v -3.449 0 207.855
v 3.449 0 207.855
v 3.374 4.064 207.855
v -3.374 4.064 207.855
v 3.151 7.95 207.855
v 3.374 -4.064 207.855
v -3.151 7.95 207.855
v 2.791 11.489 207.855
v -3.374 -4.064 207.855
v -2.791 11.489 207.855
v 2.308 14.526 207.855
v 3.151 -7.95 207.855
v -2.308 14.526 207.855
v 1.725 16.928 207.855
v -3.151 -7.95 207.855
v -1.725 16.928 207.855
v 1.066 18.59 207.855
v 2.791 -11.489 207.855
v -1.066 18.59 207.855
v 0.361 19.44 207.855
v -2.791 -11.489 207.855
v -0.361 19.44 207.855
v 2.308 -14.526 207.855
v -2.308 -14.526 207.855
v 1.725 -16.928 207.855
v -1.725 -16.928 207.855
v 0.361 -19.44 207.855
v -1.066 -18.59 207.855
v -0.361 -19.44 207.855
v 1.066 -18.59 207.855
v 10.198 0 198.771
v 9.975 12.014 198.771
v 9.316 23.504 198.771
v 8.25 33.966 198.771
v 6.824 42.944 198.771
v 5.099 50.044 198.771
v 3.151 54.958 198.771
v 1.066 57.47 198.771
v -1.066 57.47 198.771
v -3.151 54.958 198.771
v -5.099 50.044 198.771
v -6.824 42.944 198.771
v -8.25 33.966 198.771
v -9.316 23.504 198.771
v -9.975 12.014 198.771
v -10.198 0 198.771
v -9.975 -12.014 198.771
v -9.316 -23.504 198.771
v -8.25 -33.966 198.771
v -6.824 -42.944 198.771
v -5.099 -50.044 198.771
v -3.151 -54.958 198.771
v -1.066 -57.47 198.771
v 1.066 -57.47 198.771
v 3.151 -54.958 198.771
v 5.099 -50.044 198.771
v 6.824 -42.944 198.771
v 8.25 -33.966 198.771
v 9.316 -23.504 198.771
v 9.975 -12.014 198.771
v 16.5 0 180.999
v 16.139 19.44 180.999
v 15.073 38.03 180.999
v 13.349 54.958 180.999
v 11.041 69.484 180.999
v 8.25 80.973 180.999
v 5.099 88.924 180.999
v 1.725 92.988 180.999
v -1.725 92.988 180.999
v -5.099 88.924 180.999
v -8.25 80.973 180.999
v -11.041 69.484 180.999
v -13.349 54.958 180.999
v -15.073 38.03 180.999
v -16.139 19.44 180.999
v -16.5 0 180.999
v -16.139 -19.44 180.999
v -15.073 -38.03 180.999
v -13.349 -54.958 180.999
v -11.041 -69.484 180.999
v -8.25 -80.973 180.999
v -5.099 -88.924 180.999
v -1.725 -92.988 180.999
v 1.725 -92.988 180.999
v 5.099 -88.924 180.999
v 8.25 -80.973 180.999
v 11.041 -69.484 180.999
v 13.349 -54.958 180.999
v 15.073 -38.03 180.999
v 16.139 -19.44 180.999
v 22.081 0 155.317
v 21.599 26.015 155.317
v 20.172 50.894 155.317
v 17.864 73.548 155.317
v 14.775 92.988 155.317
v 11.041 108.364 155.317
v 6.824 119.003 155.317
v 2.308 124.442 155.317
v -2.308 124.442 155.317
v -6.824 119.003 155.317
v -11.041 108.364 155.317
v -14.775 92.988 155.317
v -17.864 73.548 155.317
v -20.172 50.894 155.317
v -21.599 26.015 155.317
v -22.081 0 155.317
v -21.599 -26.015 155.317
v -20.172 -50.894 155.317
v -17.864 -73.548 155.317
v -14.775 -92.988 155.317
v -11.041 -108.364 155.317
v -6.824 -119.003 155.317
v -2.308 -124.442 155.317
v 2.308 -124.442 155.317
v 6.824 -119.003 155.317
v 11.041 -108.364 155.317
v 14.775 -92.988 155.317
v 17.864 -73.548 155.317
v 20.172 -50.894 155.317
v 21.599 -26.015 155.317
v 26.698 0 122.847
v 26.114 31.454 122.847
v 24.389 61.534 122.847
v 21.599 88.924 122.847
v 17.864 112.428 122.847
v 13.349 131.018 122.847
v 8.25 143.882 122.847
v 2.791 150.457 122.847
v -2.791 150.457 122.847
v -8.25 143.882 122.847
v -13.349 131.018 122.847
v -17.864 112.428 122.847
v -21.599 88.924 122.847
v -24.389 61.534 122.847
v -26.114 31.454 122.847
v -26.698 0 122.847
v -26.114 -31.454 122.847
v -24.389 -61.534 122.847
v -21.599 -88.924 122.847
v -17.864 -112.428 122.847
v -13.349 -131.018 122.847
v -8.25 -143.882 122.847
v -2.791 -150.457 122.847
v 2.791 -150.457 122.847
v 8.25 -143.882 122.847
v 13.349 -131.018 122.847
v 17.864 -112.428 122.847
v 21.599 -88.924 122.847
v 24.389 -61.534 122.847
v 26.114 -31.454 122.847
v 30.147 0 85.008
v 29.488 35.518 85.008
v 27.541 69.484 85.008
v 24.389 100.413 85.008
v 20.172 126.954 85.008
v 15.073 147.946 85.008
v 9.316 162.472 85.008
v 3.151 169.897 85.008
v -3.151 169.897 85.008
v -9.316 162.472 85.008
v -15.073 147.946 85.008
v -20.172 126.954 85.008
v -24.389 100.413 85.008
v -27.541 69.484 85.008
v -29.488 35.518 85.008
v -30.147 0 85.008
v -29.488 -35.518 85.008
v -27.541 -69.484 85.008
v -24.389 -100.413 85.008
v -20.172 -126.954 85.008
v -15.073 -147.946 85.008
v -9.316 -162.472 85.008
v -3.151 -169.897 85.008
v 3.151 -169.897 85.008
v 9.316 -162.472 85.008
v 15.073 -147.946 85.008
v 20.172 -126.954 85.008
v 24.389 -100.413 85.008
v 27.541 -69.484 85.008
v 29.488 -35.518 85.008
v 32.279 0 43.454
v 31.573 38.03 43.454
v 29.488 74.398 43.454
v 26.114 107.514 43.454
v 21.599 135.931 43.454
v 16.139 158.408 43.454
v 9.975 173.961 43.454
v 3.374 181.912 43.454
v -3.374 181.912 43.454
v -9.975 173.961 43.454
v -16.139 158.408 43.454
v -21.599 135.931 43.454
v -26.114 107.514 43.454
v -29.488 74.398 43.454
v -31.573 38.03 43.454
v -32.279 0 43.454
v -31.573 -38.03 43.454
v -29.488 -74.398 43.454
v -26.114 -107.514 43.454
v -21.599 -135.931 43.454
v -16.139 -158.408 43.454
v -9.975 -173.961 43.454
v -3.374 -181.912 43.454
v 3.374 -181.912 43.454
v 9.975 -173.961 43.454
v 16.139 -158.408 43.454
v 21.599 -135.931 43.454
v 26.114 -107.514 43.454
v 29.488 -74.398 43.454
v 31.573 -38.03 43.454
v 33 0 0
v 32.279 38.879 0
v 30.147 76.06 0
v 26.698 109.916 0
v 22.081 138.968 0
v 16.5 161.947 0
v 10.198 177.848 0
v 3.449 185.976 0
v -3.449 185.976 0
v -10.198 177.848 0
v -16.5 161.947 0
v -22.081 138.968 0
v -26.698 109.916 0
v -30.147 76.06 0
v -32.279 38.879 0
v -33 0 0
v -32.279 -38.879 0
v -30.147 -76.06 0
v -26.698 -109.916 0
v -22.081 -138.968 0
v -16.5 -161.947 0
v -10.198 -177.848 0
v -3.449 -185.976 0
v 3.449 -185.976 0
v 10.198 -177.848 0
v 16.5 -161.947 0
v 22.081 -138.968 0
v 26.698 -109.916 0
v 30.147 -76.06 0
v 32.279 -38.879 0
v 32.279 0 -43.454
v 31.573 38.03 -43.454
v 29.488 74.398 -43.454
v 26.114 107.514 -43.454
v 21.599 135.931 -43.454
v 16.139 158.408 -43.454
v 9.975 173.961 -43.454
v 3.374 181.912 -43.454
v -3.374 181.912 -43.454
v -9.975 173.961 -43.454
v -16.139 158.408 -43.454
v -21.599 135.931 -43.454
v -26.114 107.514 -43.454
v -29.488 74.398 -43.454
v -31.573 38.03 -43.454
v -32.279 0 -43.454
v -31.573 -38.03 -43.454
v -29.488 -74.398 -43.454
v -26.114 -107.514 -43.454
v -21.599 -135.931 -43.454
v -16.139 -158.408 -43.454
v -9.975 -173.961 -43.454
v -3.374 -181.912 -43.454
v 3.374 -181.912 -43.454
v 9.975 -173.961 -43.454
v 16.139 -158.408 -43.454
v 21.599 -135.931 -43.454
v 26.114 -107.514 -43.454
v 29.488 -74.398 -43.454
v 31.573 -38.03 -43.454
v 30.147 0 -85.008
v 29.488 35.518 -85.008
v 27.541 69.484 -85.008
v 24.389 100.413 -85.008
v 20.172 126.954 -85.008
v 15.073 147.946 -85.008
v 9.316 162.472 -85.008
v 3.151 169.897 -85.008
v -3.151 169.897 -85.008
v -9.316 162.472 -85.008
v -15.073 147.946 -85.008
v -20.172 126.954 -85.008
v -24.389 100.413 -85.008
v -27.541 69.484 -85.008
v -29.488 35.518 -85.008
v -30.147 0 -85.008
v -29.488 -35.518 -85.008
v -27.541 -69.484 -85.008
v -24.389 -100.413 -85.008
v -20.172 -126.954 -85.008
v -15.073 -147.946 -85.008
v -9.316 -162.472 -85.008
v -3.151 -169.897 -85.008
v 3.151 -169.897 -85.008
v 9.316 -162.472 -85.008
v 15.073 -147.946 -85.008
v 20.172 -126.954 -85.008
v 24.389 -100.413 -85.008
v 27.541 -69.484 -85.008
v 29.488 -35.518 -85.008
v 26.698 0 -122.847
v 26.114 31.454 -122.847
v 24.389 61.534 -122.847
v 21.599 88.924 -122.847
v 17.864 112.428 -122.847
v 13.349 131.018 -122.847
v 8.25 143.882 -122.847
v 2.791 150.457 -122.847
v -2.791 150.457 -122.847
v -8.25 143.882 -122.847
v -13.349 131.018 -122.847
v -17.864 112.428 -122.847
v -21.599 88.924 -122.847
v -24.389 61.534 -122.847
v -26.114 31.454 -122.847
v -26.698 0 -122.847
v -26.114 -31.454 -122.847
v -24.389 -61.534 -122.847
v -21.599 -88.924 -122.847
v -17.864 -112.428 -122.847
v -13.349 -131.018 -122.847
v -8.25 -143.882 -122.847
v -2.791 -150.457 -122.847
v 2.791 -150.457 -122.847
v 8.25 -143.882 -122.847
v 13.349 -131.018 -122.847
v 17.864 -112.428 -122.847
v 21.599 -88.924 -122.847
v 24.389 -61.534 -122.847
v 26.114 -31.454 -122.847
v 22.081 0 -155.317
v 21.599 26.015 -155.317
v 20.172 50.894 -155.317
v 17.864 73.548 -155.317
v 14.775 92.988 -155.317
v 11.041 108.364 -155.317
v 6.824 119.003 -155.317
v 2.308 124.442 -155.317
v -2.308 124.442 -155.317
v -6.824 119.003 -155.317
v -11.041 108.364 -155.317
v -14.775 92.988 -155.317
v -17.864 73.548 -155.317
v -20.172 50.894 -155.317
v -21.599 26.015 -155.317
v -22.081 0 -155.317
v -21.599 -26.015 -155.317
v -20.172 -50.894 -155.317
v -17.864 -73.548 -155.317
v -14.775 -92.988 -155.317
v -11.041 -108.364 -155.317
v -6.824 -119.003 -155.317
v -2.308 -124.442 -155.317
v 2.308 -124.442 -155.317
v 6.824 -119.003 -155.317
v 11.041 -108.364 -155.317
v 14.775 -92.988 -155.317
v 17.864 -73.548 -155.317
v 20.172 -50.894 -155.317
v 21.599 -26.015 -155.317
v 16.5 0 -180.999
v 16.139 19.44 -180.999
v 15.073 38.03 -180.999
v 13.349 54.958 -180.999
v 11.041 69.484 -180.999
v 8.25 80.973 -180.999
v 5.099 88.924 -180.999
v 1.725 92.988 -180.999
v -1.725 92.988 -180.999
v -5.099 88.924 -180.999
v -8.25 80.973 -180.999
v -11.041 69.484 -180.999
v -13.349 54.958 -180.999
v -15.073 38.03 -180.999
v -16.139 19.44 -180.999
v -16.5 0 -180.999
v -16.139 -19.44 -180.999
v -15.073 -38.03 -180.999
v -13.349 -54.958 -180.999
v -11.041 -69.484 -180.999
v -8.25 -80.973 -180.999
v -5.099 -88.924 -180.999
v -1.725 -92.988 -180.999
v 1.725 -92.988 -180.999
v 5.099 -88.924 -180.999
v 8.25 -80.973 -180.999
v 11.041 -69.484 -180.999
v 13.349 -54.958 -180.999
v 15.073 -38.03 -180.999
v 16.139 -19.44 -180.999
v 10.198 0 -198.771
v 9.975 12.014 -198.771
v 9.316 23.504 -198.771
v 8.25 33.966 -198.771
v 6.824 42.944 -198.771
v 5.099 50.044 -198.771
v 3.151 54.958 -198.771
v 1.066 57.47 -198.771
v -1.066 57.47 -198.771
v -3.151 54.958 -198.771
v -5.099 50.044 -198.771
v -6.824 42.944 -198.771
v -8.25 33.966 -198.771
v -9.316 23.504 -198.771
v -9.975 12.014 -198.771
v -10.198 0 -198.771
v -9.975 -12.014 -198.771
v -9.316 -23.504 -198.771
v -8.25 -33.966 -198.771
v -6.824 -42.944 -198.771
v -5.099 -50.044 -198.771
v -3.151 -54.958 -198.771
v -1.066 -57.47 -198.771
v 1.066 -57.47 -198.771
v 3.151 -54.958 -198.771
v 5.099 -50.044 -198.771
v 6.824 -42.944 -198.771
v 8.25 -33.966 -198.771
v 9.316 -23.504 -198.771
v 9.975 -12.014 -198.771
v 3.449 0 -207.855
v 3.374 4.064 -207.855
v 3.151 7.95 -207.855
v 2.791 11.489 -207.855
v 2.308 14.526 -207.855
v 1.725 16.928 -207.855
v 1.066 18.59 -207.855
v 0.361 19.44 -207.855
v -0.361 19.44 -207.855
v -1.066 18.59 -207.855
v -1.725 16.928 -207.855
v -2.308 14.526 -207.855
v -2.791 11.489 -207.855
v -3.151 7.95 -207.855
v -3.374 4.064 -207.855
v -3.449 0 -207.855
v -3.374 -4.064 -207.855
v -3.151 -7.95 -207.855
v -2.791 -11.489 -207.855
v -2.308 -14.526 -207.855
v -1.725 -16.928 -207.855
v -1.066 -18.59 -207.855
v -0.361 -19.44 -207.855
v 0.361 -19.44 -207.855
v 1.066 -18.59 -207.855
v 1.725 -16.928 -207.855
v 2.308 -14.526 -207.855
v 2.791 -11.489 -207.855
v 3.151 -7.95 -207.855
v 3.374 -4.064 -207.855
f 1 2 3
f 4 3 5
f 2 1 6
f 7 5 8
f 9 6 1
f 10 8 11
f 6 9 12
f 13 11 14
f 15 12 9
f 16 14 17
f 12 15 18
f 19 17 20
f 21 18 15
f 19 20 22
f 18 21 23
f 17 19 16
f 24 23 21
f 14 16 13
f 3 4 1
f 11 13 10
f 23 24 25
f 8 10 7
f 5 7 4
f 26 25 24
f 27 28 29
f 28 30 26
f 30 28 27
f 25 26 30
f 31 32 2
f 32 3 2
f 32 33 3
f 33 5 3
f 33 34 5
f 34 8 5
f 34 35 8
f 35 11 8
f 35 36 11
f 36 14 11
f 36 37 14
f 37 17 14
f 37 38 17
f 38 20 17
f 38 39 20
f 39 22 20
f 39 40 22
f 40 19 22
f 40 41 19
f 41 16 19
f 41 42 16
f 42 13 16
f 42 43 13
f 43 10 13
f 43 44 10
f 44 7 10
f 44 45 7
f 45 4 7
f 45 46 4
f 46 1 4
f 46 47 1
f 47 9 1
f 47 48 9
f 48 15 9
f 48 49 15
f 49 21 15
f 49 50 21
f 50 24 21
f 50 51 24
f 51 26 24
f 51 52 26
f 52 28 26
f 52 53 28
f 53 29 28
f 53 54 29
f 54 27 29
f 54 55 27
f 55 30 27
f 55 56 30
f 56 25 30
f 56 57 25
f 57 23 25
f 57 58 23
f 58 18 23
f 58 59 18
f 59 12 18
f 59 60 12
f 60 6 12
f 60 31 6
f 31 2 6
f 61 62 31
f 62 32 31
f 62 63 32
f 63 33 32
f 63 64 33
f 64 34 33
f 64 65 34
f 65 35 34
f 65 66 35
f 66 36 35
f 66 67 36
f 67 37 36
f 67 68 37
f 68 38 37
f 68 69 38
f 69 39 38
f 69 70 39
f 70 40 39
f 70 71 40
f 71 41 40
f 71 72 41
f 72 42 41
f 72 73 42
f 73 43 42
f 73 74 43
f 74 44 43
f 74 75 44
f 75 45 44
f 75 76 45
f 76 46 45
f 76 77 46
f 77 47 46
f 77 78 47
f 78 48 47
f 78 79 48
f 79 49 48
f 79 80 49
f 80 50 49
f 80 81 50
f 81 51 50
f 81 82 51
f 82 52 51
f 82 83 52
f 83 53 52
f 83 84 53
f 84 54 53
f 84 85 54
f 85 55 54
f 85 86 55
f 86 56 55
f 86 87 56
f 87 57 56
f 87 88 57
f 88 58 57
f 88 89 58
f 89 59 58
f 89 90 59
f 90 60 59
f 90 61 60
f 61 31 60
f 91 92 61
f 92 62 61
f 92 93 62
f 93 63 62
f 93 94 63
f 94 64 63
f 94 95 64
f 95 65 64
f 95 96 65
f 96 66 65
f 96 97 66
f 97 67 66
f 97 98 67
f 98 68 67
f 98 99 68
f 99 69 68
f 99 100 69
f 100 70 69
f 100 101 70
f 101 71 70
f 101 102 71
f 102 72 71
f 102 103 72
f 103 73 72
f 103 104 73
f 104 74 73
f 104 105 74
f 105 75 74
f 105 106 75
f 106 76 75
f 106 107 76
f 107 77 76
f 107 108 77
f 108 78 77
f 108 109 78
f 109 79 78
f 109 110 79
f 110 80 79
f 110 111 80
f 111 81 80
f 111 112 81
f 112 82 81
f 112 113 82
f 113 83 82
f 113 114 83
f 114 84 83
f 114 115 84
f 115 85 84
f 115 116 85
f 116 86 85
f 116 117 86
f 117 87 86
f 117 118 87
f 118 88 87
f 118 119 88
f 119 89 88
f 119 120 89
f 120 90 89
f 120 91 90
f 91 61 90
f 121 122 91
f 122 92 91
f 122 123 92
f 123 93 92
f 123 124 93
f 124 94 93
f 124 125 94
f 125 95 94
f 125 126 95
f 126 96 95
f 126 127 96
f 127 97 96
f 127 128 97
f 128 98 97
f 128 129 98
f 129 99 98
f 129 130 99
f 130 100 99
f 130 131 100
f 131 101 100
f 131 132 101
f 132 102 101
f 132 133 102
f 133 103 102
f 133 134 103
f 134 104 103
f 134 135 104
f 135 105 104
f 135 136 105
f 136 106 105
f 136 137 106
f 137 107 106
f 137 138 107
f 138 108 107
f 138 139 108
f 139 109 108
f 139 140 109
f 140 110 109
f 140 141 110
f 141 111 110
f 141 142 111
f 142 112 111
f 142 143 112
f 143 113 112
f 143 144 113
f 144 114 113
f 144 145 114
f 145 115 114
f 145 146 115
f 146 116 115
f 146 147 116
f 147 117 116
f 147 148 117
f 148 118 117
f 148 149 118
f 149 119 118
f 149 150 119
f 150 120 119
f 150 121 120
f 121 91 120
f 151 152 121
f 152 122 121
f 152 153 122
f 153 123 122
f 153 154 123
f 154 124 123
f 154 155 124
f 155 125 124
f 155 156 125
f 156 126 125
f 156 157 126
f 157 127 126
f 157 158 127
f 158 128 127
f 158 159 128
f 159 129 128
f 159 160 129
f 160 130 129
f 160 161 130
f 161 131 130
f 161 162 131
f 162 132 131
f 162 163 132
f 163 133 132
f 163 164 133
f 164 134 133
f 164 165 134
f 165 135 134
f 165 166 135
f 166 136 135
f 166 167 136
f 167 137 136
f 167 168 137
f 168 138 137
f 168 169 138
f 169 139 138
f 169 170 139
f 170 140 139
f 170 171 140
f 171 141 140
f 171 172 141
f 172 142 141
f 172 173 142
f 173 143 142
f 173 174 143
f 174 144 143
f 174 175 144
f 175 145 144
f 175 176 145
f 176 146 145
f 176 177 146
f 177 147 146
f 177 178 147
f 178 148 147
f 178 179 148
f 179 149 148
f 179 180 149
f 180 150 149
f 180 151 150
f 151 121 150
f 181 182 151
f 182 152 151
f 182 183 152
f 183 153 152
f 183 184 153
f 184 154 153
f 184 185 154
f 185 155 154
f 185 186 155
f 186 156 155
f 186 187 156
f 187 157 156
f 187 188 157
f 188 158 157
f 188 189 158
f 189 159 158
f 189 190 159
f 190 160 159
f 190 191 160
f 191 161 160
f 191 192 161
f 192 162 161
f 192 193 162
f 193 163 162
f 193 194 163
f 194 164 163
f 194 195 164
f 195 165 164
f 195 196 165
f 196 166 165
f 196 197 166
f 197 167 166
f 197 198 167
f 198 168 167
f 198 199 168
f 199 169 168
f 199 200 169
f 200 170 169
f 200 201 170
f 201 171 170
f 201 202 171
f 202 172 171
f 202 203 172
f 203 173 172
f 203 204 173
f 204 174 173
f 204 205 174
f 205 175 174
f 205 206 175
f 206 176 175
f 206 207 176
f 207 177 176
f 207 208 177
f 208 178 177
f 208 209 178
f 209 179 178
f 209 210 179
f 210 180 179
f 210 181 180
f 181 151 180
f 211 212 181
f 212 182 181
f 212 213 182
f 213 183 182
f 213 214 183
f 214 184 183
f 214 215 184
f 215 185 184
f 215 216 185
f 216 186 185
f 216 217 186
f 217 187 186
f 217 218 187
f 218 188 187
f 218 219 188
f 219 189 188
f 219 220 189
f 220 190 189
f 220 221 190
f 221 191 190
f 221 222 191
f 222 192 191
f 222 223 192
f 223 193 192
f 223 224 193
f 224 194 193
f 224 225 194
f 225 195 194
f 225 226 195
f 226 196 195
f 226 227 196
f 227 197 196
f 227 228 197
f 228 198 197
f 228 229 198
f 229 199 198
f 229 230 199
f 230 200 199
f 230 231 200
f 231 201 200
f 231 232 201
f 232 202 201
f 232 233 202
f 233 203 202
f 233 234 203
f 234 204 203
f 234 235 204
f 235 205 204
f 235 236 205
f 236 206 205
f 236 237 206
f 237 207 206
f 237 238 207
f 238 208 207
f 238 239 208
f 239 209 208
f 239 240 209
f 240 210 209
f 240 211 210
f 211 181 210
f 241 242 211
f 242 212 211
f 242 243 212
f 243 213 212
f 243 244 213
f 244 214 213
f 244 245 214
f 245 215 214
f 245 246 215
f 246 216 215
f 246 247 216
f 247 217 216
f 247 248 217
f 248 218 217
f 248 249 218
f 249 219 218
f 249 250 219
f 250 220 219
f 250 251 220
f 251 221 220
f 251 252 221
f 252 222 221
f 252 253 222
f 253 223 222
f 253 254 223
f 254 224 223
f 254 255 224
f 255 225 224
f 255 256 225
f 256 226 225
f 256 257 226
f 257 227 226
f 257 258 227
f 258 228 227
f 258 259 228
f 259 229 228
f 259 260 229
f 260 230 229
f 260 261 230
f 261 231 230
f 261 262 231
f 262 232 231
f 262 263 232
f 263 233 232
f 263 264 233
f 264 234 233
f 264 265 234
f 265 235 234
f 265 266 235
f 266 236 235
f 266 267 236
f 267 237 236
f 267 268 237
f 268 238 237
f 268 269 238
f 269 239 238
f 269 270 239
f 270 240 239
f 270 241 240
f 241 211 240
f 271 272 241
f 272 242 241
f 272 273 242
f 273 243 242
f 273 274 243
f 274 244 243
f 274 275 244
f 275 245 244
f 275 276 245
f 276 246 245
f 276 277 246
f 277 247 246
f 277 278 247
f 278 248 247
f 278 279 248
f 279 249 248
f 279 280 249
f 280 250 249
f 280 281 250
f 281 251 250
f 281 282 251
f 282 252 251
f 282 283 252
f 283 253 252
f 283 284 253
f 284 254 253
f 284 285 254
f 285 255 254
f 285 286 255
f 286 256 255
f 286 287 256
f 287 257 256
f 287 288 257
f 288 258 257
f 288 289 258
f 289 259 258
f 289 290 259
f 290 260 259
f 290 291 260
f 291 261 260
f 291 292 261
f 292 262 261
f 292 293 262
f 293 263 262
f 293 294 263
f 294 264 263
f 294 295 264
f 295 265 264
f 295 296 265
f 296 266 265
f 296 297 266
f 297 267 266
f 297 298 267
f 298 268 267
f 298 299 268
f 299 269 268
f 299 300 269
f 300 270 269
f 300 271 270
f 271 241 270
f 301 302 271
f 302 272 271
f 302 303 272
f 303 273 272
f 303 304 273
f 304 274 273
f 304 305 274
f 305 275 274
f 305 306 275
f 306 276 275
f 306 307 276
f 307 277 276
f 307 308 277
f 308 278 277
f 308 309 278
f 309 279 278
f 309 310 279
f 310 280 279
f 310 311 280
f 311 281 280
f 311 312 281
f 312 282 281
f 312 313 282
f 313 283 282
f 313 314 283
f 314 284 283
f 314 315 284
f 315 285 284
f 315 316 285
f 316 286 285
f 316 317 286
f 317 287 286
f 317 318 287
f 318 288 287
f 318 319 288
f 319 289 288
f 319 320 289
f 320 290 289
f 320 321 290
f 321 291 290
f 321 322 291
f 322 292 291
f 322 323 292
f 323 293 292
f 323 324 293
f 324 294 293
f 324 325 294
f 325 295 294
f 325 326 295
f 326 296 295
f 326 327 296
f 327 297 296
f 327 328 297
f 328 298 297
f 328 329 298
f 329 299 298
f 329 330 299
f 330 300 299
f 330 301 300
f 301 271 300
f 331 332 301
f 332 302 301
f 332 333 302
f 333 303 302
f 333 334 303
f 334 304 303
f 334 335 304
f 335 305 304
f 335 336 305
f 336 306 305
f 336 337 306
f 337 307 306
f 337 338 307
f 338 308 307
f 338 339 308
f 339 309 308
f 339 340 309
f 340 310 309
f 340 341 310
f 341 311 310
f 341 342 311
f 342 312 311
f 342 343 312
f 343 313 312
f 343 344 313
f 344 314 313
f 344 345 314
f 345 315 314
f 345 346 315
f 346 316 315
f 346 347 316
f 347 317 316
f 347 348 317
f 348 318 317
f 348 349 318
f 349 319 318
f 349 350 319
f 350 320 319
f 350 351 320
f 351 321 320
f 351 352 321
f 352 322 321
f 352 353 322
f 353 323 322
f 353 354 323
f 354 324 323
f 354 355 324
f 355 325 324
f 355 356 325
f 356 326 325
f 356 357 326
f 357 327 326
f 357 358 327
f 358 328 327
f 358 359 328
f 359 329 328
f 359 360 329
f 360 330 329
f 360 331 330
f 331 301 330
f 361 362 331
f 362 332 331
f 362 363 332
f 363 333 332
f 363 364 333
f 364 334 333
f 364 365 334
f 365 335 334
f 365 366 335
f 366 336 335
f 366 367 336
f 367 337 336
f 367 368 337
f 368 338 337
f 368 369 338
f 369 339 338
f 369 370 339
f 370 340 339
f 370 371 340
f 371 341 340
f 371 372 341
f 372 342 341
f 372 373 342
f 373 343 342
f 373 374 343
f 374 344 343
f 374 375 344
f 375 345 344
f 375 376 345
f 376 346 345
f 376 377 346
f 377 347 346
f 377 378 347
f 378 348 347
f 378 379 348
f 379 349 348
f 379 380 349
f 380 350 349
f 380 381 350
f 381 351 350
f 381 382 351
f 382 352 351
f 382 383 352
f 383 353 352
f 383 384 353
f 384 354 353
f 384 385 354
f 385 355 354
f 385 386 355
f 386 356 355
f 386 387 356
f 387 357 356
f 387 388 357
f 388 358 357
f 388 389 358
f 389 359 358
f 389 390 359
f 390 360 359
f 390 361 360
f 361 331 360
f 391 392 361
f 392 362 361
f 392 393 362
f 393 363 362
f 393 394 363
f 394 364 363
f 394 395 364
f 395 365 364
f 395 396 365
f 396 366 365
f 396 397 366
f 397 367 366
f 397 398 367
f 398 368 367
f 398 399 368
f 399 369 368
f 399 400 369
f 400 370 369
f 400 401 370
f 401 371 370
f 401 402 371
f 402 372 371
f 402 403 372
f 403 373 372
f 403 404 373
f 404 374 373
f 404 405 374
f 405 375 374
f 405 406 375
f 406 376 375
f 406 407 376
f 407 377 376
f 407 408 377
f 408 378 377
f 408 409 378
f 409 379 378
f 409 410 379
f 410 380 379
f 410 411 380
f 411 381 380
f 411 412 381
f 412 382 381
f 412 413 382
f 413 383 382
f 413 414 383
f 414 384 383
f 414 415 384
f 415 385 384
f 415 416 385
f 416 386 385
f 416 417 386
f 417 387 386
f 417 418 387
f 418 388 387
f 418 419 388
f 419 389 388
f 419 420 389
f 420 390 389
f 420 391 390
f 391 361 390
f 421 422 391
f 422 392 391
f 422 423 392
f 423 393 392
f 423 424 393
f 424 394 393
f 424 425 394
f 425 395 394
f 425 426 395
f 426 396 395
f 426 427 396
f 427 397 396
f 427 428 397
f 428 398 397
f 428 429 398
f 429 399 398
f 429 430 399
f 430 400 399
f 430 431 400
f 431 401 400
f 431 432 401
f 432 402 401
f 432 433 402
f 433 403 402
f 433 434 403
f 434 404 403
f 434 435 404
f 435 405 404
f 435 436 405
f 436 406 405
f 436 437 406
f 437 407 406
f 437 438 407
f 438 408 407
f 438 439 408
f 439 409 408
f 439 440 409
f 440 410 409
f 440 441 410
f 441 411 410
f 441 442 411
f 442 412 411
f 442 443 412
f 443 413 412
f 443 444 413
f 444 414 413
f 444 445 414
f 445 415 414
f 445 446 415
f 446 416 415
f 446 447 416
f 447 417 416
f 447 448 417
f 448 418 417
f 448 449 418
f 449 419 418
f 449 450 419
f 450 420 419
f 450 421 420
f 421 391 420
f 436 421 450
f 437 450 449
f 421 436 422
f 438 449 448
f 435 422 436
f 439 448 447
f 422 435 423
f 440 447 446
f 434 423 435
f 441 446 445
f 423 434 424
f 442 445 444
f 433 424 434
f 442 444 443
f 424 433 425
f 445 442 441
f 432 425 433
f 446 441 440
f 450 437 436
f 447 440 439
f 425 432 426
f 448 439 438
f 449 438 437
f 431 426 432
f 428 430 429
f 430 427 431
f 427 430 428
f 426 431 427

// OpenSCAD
// Generated by SolidPython 1.0.1 on 2020-07-29 00:46:46


scale(v = [3, 17, 19]) {
	sphere(r = 11);
}
/***********************************************
*********      SolidPython code:      **********
************************************************
 
# import packages: SolidPython
from solid import *
from solid.utils import *
from itertools import chain, combinations, permutations


class Resize:

    def __init__(self, scad_file):
        self.scad_file = scad_file
        #self.scad_file = import_scad(scad_file)
        # cone/cylinder param:
        self.r1 = 0
        self.r2 = 0
        self.h = 0
        # rectangular prism param:
        self.w = 0
        self.l = 0
        # ellipse param:
        self.r = 0

    # import OpenScad code (file name corresponds to shape)


    # classify shape + parameters
    def assign(self, param1, param2, param3):
        if self.scad_file == 'cone.scad':
            self.r1 = param1
            self.r2 = param2
            self.h = param3
        elif self.scad_file == 'cylinder.scad':
            self.r1 = param1
            self.r2 = param2
            self.h = param3
        elif self.scad_file == 'rectangularPrism.scad':
            self.h = param1
            self.l = param2
            self.w = param3
        else:
            self.r = param1
            self.h = param2

    # resize parameters
    def iterate(self):
        x = range(3, 20, 2)
        i = 1
        if self.scad_file == 'cone.scad':
            tempList = list(permutations(x, 2))
            for temp in tempList:
                param1 = temp[0]
                param2 = temp[1]
                filepath = 'produced_scad_files/' + 'cone' + str(param1) + '_' + str(param2) + '_' + '.scad'
                scad_render_to_file(cylinder(h=param1, r1=param2, r2=0), filepath)

        elif self.scad_file == 'cylinder.scad':
            tempList = list(permutations(x, 3))
            for temp in tempList:
                param1 = temp[0]
                param2 = temp[1]
                filepath = 'produced_scad_files/' + 'cylinder' + str(param1) + '_' + str(param2) + '_' + '.scad'
                scad_render_to_file(cylinder(h=param1, r1=param2, r2=param2), filepath)

        elif self.scad_file == 'rectangularPrism.scad':
            tempList = list(permutations(x, 3))
            for temp in tempList:
                param1 = temp[0]
                param2 = temp[1]
                param3 = temp[2]
                filepath = 'produced_scad_files/' + 'rectangularPrism' + str(param1) + '_' + str(param2) + '_' + str(
                    param3) + '.scad'
                scad_render_to_file(cube(size=(param1, param2, param3)), filepath)

        elif self.scad_file == 'ellipse.scad':
            tempList = list(permutations(x, 4))
            for temp in tempList:
                param1 = temp[0]
                param2 = temp[1]
                param3 = temp[2]
                param4 = temp[3]
                filepath = 'produced_scad_files/' + 'ellipse' + str(param1) + '_' + str(param2) + '_' + str(param3) + '_' + str(param4) + '.scad'
                scad_render_to_file(scale([param1, param2, param3])(sphere(r=param4)), filepath)

    def render_to_scadfile(self):
        scad_render_to_file(scad, 'example.scad') 
 
************************************************/
